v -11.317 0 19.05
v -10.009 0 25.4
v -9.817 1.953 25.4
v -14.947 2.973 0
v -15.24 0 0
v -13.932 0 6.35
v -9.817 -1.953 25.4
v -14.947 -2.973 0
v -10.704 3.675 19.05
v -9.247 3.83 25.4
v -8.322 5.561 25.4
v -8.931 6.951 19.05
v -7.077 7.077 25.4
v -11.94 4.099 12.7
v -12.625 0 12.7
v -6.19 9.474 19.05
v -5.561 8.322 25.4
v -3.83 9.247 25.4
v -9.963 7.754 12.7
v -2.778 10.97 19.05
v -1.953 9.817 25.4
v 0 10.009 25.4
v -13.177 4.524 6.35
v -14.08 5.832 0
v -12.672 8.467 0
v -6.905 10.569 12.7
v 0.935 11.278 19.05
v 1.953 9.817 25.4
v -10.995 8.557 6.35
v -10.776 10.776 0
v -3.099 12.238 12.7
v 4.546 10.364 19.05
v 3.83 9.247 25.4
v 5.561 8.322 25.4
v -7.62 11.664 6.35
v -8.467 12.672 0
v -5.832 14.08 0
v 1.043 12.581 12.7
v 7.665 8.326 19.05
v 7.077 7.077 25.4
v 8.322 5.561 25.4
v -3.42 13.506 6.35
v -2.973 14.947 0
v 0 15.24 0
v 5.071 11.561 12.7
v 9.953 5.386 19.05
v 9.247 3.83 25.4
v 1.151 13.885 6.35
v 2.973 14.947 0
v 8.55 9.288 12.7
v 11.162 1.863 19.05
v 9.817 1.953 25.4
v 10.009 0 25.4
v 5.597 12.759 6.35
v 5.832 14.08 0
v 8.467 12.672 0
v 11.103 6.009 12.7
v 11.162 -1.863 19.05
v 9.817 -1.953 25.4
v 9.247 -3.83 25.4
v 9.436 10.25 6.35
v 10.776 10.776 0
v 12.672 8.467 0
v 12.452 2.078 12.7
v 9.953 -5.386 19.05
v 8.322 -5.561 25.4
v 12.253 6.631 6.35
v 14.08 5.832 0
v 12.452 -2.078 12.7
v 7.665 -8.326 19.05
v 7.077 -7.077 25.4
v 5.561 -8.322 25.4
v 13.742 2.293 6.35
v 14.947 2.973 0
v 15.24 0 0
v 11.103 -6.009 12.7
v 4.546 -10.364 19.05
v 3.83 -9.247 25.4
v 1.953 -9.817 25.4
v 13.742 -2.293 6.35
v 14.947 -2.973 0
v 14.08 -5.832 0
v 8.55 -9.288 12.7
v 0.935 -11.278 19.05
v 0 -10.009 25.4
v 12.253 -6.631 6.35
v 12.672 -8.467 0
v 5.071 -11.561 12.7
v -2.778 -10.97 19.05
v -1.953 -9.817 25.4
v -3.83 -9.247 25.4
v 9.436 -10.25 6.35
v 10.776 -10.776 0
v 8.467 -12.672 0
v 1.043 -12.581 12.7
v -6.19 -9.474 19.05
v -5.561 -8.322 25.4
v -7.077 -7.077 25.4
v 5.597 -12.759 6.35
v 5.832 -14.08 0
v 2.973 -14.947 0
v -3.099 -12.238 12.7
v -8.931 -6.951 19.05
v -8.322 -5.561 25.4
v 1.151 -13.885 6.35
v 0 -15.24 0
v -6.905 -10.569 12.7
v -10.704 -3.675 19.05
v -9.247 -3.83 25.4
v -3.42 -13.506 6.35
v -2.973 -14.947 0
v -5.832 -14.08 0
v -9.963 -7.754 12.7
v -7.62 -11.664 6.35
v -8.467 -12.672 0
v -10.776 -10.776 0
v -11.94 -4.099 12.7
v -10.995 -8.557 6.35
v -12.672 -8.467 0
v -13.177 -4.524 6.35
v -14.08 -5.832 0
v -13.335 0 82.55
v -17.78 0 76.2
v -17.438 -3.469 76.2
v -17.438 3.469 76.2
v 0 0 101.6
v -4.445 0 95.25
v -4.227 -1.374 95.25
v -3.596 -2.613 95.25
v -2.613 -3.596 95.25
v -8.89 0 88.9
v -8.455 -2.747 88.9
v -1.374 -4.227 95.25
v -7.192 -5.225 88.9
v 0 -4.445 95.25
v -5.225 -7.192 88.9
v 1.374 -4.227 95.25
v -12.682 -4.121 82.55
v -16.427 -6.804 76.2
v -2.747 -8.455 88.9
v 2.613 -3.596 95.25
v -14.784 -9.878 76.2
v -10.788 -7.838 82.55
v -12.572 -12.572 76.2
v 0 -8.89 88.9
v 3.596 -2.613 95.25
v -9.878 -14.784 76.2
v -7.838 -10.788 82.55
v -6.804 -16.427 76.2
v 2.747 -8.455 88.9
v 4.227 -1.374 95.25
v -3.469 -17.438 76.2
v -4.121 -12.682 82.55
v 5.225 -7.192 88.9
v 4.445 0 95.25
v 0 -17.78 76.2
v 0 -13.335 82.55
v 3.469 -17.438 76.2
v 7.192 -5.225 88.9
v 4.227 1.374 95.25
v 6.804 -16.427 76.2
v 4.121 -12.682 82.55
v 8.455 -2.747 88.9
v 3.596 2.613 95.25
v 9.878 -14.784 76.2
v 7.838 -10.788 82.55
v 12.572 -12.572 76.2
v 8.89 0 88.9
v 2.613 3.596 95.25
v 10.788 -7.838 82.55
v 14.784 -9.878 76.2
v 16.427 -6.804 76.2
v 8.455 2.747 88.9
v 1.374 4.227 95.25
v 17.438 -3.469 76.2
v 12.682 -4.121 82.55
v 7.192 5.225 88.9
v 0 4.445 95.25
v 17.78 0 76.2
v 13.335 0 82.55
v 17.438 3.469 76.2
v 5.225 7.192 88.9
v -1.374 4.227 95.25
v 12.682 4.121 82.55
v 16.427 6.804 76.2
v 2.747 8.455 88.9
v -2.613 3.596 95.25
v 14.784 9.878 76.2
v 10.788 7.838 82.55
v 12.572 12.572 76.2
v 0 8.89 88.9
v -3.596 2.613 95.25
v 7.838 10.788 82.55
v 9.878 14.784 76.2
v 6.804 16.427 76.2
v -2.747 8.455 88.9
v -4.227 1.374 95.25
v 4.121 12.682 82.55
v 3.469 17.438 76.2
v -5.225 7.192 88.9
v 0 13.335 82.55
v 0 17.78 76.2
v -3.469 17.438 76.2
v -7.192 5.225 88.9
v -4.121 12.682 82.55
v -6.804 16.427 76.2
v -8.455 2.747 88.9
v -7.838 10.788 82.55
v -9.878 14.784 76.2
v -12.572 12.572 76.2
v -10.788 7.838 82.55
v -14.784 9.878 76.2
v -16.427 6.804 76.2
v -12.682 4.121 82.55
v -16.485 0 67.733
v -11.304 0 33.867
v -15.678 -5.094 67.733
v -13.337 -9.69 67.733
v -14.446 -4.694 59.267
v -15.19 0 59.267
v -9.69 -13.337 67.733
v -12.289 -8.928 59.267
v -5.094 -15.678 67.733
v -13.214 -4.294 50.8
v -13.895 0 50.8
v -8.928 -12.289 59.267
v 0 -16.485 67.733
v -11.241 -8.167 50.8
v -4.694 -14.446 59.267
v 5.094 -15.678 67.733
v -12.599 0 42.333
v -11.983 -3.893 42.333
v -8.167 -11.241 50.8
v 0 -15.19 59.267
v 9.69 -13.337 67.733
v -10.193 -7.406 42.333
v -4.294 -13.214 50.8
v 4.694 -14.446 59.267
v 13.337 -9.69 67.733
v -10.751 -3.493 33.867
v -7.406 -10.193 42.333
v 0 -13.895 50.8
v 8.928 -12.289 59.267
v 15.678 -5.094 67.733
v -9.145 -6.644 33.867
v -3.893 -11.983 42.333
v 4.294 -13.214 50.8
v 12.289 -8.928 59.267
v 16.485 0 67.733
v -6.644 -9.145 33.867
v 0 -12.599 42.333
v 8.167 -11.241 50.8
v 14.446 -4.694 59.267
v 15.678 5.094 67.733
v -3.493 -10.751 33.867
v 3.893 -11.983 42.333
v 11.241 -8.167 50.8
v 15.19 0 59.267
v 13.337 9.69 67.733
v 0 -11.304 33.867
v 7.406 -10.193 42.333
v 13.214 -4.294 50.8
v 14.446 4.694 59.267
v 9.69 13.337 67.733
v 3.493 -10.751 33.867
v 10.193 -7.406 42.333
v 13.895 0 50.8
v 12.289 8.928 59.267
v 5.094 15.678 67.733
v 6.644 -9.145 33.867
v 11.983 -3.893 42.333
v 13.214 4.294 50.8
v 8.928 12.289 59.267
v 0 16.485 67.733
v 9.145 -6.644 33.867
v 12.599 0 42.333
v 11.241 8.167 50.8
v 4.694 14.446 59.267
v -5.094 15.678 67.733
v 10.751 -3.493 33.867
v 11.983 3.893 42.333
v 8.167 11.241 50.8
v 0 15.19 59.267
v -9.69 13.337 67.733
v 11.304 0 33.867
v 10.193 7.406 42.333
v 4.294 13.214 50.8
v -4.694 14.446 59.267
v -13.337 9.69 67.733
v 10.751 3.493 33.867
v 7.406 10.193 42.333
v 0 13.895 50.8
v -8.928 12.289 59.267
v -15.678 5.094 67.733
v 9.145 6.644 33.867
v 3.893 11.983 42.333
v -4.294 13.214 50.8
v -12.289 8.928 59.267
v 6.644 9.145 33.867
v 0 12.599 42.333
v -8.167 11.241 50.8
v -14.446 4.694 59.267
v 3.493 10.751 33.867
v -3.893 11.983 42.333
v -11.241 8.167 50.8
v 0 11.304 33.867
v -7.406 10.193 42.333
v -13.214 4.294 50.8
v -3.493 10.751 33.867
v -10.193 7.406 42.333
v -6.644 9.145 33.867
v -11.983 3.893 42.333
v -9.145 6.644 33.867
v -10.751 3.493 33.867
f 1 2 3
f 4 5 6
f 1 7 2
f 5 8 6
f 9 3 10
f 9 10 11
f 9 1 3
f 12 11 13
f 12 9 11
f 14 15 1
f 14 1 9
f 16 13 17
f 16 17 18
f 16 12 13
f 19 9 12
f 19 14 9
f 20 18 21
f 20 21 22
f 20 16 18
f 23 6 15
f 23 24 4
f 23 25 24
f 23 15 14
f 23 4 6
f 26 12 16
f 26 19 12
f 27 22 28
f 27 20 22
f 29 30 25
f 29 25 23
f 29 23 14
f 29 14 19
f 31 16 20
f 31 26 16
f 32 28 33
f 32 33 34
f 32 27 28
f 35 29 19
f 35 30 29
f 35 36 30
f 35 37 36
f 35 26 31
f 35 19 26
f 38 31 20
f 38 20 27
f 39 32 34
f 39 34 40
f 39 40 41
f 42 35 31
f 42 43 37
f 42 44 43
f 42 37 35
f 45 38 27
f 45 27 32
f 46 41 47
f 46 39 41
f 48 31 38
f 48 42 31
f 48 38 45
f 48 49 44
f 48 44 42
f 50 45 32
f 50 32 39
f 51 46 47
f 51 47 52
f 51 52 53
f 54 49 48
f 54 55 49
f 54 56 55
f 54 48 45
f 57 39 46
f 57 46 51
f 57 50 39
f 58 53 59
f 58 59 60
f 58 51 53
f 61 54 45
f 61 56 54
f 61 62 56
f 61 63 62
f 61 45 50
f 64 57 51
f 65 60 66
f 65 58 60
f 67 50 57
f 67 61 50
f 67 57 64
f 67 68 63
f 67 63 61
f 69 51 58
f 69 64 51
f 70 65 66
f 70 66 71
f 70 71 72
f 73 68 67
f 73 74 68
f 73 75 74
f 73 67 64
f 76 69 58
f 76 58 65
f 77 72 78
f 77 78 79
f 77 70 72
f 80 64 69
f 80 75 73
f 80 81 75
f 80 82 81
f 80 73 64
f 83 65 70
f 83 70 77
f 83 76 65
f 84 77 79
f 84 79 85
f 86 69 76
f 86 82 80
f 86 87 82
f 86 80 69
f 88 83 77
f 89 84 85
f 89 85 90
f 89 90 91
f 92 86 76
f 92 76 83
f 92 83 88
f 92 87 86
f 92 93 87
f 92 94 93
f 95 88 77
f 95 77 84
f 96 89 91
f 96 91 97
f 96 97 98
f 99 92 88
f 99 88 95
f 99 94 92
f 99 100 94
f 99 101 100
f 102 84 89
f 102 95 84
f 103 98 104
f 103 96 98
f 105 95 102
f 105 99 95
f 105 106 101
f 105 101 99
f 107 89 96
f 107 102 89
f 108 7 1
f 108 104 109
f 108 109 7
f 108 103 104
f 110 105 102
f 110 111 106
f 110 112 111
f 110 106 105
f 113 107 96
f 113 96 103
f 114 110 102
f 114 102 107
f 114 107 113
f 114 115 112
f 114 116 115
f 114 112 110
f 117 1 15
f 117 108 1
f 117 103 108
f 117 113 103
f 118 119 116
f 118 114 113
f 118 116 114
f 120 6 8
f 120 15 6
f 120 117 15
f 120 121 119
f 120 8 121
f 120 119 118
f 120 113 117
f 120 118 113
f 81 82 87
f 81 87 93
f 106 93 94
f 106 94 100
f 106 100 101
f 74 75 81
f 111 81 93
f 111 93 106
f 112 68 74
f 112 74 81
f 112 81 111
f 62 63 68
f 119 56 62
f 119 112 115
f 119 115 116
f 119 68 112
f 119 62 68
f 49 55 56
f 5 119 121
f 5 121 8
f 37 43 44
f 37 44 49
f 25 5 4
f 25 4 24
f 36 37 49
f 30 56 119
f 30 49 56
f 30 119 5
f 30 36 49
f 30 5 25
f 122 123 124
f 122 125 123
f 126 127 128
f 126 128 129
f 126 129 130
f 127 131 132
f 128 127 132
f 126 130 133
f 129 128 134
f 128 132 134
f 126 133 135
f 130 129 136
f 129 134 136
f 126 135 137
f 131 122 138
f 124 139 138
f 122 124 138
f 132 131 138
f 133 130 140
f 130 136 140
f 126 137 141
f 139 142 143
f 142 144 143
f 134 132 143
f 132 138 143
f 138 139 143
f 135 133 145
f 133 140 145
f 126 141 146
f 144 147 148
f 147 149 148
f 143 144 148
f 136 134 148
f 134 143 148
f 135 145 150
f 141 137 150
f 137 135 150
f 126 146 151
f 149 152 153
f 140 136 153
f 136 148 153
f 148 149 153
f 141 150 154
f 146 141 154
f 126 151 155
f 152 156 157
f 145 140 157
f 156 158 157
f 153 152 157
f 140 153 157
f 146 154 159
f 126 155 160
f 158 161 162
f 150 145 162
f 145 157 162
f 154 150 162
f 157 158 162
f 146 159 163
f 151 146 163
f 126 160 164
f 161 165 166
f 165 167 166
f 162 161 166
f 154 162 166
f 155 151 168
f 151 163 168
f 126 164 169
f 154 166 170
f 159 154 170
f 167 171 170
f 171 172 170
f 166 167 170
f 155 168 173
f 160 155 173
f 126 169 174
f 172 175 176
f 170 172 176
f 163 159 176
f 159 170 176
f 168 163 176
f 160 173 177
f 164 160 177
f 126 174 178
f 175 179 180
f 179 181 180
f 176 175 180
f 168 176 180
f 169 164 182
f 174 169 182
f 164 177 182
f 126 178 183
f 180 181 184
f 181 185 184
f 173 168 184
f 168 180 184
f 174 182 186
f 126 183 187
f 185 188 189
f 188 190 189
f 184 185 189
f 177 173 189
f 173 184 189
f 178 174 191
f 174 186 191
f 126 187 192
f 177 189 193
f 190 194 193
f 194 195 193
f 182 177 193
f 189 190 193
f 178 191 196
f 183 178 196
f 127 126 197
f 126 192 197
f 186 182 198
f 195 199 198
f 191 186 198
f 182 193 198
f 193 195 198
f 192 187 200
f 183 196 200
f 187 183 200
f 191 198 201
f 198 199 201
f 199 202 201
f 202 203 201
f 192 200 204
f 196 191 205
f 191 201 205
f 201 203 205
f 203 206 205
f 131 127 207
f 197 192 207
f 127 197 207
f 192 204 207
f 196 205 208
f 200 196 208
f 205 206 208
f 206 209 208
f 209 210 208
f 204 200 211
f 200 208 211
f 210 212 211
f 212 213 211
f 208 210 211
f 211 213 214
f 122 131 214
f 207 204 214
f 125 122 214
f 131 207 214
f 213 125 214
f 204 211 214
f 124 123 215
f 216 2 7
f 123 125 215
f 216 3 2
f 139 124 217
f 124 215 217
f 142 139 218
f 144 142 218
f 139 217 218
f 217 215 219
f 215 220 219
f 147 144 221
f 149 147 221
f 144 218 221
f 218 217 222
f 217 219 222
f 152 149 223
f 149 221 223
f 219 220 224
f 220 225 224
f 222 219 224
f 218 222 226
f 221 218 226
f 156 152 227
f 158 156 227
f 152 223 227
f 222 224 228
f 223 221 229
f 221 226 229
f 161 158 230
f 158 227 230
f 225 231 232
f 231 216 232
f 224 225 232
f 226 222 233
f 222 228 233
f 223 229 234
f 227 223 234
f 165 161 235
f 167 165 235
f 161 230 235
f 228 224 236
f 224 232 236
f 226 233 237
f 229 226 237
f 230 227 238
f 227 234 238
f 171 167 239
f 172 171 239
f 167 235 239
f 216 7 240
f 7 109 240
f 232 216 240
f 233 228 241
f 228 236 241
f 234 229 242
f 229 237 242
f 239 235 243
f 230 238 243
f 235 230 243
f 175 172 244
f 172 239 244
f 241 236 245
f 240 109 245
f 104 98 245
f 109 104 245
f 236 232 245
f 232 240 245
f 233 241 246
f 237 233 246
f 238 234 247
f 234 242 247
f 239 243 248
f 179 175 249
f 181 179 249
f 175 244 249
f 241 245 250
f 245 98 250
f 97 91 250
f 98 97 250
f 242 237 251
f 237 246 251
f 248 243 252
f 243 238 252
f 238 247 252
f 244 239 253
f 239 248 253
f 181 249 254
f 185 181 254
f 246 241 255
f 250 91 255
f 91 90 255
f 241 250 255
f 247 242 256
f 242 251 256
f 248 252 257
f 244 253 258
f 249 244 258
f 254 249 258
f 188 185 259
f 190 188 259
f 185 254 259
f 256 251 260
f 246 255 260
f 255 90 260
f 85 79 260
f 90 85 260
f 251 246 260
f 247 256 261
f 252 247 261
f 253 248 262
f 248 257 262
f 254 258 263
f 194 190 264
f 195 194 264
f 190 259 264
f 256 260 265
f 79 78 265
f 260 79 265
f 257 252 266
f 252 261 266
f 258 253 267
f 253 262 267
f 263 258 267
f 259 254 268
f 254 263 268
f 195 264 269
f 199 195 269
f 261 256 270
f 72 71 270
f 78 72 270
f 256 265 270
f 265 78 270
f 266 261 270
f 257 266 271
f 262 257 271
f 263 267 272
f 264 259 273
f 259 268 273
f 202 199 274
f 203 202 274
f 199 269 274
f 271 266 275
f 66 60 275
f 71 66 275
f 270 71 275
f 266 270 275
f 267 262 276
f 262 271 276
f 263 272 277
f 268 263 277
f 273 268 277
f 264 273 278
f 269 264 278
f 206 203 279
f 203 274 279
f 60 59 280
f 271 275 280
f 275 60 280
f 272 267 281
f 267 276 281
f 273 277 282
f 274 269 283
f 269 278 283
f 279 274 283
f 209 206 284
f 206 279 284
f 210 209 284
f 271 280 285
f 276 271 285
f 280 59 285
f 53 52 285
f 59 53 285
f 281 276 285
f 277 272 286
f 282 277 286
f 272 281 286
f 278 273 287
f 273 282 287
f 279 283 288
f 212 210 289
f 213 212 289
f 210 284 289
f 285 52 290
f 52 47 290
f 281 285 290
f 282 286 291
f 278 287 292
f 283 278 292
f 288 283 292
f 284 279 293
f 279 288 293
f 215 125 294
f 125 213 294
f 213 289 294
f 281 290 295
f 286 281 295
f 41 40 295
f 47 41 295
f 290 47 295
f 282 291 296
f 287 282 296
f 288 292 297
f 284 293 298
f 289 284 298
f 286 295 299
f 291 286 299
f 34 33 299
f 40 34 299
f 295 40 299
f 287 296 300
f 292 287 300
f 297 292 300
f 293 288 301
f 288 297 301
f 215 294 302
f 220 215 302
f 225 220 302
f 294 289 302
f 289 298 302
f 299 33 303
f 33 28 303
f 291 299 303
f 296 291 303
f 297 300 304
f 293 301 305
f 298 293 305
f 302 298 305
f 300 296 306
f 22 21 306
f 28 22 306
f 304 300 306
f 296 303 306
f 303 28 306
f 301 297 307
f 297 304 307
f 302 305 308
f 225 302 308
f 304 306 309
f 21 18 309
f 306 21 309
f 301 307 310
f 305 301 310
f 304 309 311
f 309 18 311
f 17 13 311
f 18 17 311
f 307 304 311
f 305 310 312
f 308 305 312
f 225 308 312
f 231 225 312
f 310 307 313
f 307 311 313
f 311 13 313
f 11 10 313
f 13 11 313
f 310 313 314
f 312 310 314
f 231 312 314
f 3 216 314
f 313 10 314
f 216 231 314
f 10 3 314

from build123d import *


with BuildPart() as f1:
    # F0 (on Front) → F1 (revolve)
    with BuildSketch(Plane.XZ):
        Polygon((-15.24, 0), (0, 0), (0, 25.4), (-10.009029, 25.4), align=None)
    revolve(axis=Axis((0, 0, 12.7), (0, 0, -1)))

    # F2 (on Front) → F3 (revolve)
    with BuildSketch(Plane.XZ):
        Polygon((-17.78, 76.2), (-10.009029, 25.4), (0, 25.4), (0, 76.2), align=None)
    revolve(axis=Axis((0, 0, 50.8), (0, 0, 1)))

    # F4 (on Front) → F5 (revolve)
    with BuildSketch(Plane.XZ):
        Polygon((0, 101.6), (-17.78, 76.2), (0, 76.2), align=None)
    revolve(axis=Axis((0, 0, 88.9), (0, 0, 1)))


solid = f1.part
